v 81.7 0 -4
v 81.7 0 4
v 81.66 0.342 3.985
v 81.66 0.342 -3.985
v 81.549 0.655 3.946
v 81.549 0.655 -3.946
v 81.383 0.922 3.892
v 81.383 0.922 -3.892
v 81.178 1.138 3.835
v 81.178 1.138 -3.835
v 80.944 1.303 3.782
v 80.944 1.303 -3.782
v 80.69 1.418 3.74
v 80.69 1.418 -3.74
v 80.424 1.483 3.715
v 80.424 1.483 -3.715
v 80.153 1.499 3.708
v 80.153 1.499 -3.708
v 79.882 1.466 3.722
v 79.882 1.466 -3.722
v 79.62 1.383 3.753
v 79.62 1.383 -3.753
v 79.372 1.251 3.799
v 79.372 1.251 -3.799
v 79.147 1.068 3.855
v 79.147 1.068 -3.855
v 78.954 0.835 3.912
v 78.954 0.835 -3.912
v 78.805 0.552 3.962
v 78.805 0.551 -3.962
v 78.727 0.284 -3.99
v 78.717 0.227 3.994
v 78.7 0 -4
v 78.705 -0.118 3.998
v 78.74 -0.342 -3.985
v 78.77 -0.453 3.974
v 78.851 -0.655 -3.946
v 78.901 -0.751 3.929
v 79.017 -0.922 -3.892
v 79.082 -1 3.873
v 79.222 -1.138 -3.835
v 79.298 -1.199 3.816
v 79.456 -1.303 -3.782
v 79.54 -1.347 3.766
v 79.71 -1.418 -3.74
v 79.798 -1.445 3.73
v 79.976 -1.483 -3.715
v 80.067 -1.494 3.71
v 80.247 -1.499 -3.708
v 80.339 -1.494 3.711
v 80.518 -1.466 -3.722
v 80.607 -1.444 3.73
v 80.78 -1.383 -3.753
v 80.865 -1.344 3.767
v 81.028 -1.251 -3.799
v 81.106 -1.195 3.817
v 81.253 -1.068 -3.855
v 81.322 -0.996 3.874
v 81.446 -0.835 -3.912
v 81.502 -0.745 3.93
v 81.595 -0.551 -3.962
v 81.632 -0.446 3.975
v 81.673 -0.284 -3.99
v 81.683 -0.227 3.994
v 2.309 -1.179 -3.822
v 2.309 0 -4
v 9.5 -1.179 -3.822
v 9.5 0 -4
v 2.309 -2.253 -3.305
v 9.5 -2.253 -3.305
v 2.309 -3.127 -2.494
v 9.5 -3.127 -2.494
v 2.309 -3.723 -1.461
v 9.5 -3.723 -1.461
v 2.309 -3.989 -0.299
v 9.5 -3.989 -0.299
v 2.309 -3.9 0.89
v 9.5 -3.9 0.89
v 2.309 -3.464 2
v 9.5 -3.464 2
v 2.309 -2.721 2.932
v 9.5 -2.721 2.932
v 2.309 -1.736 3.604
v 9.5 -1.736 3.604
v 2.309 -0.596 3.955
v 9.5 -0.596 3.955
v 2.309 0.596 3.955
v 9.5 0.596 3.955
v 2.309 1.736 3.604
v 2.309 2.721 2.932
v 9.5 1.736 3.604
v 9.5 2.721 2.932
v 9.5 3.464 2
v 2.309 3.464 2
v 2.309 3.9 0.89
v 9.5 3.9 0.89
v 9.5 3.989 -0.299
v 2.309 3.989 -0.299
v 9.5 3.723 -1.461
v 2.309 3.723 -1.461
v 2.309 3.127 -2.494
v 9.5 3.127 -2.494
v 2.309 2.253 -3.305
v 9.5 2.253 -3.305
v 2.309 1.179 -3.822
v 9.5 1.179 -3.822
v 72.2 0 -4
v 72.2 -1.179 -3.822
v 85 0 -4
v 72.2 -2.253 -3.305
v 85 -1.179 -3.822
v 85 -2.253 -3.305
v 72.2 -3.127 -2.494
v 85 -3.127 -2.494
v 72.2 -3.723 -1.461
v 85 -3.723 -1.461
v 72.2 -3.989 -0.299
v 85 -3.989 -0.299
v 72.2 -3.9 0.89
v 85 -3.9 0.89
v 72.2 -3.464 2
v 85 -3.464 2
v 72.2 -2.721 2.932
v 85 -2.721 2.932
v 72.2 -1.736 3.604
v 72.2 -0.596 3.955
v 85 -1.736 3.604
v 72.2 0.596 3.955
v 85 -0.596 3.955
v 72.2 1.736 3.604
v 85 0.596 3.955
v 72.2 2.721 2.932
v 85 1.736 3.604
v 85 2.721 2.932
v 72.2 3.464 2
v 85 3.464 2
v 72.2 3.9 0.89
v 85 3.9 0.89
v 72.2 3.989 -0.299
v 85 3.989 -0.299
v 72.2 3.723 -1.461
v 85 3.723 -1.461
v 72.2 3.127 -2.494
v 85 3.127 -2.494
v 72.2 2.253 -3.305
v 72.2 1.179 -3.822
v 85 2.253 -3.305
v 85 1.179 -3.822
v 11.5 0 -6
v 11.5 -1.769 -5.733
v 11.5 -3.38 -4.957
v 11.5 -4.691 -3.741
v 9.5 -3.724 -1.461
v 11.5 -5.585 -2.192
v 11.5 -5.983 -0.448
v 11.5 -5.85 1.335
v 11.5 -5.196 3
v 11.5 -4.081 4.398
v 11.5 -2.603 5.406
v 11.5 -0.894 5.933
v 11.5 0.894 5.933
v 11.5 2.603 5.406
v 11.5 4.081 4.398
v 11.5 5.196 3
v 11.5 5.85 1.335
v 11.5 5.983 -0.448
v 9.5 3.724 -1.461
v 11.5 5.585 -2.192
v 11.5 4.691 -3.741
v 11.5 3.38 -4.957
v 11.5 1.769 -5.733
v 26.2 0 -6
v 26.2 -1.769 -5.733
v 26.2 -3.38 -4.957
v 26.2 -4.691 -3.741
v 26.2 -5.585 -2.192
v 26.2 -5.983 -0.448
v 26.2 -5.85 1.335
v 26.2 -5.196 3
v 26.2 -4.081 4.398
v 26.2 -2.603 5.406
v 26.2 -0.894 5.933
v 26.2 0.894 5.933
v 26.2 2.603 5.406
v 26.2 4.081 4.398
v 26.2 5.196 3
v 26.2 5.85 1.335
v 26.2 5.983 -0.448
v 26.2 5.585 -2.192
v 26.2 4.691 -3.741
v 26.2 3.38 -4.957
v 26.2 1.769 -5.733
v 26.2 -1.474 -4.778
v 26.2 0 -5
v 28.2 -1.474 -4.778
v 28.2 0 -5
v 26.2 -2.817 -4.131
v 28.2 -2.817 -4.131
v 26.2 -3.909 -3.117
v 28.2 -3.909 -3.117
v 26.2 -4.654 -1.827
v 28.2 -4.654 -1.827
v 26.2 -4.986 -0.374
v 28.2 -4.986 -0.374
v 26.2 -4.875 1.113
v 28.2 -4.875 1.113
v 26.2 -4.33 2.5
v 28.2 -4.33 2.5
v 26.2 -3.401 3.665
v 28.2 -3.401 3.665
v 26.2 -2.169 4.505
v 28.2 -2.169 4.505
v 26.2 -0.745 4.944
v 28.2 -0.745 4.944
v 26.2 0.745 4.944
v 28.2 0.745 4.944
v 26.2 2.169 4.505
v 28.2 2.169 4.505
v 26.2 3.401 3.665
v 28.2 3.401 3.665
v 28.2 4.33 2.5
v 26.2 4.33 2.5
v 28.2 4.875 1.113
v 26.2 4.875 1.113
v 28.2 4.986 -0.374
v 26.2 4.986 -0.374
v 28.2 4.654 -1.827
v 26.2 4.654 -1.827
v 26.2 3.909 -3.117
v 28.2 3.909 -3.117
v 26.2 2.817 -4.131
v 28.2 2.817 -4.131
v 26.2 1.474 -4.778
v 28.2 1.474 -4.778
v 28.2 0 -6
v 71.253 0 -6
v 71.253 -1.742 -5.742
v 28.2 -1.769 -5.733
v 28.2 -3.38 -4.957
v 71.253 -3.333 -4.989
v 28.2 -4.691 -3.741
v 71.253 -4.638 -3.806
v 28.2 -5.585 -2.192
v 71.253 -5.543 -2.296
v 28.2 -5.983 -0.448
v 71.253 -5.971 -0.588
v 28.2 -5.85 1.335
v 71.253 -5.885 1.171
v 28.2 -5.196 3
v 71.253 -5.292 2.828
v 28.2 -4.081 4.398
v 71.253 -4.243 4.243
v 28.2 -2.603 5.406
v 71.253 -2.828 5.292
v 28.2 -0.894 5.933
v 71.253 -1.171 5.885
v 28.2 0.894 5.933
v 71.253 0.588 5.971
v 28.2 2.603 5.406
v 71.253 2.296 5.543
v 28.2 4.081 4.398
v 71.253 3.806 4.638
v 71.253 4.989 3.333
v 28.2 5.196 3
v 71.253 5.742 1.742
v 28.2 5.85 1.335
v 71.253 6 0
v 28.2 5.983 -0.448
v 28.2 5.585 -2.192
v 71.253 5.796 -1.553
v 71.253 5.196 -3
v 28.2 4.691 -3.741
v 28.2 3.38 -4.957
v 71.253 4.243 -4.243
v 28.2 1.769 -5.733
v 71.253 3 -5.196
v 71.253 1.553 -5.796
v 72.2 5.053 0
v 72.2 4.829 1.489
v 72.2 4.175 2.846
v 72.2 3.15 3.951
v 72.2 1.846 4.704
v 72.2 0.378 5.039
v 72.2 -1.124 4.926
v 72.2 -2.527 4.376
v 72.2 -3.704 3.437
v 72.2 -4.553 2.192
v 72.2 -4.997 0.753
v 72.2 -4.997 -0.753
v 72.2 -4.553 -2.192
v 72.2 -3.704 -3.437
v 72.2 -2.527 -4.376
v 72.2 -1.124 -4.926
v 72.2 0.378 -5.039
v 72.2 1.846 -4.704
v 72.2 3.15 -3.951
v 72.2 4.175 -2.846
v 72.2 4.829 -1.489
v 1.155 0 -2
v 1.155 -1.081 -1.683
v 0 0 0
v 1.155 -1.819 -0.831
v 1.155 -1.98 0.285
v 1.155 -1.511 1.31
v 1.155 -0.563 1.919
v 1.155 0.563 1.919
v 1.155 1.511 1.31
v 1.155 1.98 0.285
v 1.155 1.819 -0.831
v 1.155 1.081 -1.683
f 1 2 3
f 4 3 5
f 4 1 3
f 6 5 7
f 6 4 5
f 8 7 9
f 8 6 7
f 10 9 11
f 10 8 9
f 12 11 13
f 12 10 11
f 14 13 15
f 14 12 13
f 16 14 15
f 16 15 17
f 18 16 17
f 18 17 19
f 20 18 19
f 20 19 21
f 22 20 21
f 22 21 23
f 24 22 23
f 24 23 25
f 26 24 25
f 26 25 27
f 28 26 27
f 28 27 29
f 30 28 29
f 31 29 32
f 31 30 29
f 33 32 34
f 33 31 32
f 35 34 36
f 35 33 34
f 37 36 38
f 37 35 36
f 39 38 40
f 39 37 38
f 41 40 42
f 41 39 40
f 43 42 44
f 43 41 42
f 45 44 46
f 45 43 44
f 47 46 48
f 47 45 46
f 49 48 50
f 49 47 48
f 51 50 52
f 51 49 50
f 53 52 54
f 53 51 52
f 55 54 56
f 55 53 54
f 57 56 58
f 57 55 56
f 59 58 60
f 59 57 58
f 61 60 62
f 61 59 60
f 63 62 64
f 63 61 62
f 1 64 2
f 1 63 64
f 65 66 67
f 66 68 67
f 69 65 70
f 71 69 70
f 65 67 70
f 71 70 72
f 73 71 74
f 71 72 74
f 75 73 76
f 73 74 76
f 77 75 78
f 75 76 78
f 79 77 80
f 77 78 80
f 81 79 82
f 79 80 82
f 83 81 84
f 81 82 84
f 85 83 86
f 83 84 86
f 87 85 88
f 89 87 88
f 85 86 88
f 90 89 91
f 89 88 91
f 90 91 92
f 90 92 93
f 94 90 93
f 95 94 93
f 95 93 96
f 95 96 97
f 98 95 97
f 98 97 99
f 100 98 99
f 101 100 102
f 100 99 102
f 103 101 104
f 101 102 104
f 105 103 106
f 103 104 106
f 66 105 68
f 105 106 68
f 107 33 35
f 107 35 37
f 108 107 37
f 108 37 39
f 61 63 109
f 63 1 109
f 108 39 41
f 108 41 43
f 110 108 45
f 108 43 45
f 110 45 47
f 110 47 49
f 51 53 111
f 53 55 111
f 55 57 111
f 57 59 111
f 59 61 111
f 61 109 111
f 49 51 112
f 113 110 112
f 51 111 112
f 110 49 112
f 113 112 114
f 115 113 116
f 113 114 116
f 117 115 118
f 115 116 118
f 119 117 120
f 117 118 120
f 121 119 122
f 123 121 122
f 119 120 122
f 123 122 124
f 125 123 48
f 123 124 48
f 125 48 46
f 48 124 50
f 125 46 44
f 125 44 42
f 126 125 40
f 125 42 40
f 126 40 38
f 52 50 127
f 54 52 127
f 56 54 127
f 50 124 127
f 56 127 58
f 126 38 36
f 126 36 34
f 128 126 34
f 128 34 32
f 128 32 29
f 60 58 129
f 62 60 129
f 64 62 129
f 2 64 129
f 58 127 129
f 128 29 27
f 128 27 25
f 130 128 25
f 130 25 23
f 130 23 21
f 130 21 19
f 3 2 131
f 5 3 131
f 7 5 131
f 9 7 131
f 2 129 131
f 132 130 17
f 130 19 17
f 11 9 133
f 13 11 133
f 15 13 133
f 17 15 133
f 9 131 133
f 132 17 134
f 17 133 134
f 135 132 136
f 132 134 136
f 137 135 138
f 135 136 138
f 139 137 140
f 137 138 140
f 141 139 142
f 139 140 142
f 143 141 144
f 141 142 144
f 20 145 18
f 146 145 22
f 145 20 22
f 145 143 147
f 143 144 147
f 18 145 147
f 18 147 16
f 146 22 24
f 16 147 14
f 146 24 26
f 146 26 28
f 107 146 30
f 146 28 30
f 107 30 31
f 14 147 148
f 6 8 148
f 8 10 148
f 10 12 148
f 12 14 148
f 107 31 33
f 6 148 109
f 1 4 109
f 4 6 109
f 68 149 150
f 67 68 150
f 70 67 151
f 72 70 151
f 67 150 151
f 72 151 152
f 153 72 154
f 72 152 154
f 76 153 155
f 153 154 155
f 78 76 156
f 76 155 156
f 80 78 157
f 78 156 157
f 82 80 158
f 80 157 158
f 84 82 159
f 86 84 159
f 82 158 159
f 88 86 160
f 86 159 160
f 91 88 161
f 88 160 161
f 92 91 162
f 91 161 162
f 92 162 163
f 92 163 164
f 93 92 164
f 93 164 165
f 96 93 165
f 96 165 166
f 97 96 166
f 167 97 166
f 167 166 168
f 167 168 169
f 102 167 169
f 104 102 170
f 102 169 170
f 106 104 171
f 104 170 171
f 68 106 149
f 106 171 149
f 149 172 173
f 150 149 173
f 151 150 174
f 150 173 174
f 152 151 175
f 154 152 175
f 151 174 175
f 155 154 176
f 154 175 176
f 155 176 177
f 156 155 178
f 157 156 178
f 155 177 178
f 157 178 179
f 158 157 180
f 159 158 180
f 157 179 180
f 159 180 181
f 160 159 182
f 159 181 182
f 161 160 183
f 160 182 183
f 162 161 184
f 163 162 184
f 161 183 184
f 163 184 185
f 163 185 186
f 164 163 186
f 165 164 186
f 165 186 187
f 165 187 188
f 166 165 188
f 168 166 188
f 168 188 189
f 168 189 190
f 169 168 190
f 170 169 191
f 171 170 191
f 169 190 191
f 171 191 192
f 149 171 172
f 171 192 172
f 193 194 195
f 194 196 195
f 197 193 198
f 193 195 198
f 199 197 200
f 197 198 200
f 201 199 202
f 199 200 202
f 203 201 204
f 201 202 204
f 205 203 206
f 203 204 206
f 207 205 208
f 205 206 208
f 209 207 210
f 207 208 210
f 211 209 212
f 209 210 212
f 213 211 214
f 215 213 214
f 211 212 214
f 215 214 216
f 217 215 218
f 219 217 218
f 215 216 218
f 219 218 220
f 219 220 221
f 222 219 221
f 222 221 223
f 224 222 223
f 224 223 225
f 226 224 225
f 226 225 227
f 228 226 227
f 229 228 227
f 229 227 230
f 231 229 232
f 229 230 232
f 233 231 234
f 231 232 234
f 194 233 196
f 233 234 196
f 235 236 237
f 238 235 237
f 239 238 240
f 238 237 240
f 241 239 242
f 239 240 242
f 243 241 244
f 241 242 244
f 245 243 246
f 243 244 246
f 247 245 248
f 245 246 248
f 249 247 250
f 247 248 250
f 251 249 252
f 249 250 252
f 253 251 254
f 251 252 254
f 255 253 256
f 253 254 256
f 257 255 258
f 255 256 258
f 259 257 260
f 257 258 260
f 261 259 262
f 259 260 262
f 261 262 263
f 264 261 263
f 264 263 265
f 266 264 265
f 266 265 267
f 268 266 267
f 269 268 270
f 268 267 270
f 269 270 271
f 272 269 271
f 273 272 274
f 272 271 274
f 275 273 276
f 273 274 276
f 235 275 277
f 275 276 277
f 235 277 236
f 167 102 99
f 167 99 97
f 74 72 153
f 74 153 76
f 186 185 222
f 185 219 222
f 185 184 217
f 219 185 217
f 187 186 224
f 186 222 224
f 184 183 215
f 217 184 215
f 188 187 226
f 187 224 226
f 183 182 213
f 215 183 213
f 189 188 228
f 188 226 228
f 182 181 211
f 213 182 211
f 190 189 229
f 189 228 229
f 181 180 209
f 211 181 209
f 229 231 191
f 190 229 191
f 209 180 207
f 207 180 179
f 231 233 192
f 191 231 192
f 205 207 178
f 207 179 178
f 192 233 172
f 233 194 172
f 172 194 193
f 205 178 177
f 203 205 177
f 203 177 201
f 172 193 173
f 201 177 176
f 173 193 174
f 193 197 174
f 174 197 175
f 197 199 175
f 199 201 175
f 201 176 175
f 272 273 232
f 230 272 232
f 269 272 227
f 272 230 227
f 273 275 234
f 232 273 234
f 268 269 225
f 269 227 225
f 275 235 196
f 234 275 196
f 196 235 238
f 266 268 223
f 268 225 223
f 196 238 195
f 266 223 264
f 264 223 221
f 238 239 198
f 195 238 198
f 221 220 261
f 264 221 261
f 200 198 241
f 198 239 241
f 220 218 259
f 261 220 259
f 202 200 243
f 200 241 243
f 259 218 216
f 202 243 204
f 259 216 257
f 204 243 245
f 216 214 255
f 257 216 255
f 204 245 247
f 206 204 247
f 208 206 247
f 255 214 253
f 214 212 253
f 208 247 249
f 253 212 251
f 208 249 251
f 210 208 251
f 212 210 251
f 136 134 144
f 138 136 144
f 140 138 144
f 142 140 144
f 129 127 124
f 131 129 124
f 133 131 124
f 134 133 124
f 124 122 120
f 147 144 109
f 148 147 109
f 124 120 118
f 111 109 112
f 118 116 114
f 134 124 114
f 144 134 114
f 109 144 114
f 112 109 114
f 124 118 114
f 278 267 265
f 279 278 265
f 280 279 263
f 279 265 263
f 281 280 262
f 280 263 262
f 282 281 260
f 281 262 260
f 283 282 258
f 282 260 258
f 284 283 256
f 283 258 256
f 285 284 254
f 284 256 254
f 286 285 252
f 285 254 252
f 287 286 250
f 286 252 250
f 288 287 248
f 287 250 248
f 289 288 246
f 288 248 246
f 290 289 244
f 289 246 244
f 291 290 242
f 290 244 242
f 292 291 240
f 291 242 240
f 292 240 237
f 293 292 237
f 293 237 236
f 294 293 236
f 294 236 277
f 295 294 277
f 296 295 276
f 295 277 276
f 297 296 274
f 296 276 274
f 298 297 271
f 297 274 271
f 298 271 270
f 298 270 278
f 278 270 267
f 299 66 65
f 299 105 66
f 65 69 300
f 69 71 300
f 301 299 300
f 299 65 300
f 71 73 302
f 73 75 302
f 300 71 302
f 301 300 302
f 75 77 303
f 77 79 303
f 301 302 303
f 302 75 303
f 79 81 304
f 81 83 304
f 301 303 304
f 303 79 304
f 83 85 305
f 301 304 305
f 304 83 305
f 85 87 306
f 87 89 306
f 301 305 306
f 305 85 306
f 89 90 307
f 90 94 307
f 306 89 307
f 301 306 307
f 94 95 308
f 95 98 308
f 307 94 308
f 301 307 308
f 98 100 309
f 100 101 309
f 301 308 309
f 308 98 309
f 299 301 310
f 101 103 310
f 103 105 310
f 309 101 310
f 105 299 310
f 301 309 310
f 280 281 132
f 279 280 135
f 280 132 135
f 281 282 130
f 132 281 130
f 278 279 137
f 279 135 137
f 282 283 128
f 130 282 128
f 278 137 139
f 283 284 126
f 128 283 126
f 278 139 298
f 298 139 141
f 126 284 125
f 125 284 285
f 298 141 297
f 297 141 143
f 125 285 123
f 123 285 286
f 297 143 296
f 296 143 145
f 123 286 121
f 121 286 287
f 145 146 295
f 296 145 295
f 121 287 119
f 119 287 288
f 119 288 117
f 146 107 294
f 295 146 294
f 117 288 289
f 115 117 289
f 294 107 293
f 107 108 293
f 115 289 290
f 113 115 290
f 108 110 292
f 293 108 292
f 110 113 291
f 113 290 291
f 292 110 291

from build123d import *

# Parameters (mm, degrees)
CUT_EXTRUDE_1_DEPTH      = 86.422479477
CUT_EXTRUDE_1_DEPTH_BACK = 86.422479477
SKETCH_3_R               = 1.5
CHAMFER_1_SIZE           = 2


# Read off the part's stored shape, not the designer's step: M12 机械螺纹 螺柱1
with BuildPart() as part:
    # 草图1 → 旋转1 (revolve)
    with BuildSketch(Plane.XY, mode=Mode.PRIVATE) as revolve_1_sk:
        Polygon((0, 0), (2.309401077, 4), (9.5, 4), (9.5, 6), (26.2, 6), (26.2, 5), (28.2, 5), (28.2, 6), (72.2, 6), (72.2, 4), (85, 4), (85, 0), align=None)
    revolve(revolve_1_sk.sketch.rotate(Axis((85, 0, 0), (-1, 0, 0)), 90), axis=Axis((85, 0, 0), (-1, 0, 0)))

    # M12 机械螺纹 螺柱1 outline → M12 机械螺纹 螺柱1 (revolve, cut)
    with BuildSketch(Plane.YX):
        Polygon((6, 72.2), (5.053, 72.2), (6, 71.253), align=None)
    revolve(axis=Axis((0, 0, 0), (1, 0, 0)), mode=Mode.SUBTRACT)

    # 草图3 → 切除-拉伸1 (cut, two sides: drawn at the far end of the back side and taken through both)
    with BuildSketch(Plane.XY.offset(-CUT_EXTRUDE_1_DEPTH_BACK)):
        with Locations((80.2, 0)):
            Circle(SKETCH_3_R)
    extrude(amount=CUT_EXTRUDE_1_DEPTH + CUT_EXTRUDE_1_DEPTH_BACK, mode=Mode.SUBTRACT)

    # 倒角1
    chamfer_1_edges = [part.edges().sort_by_distance(p)[0] for p in [
        (9.5, 0, 6),
    ]]
    chamfer(chamfer_1_edges, length=CHAMFER_1_SIZE - 0.0001)  # a hair under: the kernel refuses the full size


solid = part.part
